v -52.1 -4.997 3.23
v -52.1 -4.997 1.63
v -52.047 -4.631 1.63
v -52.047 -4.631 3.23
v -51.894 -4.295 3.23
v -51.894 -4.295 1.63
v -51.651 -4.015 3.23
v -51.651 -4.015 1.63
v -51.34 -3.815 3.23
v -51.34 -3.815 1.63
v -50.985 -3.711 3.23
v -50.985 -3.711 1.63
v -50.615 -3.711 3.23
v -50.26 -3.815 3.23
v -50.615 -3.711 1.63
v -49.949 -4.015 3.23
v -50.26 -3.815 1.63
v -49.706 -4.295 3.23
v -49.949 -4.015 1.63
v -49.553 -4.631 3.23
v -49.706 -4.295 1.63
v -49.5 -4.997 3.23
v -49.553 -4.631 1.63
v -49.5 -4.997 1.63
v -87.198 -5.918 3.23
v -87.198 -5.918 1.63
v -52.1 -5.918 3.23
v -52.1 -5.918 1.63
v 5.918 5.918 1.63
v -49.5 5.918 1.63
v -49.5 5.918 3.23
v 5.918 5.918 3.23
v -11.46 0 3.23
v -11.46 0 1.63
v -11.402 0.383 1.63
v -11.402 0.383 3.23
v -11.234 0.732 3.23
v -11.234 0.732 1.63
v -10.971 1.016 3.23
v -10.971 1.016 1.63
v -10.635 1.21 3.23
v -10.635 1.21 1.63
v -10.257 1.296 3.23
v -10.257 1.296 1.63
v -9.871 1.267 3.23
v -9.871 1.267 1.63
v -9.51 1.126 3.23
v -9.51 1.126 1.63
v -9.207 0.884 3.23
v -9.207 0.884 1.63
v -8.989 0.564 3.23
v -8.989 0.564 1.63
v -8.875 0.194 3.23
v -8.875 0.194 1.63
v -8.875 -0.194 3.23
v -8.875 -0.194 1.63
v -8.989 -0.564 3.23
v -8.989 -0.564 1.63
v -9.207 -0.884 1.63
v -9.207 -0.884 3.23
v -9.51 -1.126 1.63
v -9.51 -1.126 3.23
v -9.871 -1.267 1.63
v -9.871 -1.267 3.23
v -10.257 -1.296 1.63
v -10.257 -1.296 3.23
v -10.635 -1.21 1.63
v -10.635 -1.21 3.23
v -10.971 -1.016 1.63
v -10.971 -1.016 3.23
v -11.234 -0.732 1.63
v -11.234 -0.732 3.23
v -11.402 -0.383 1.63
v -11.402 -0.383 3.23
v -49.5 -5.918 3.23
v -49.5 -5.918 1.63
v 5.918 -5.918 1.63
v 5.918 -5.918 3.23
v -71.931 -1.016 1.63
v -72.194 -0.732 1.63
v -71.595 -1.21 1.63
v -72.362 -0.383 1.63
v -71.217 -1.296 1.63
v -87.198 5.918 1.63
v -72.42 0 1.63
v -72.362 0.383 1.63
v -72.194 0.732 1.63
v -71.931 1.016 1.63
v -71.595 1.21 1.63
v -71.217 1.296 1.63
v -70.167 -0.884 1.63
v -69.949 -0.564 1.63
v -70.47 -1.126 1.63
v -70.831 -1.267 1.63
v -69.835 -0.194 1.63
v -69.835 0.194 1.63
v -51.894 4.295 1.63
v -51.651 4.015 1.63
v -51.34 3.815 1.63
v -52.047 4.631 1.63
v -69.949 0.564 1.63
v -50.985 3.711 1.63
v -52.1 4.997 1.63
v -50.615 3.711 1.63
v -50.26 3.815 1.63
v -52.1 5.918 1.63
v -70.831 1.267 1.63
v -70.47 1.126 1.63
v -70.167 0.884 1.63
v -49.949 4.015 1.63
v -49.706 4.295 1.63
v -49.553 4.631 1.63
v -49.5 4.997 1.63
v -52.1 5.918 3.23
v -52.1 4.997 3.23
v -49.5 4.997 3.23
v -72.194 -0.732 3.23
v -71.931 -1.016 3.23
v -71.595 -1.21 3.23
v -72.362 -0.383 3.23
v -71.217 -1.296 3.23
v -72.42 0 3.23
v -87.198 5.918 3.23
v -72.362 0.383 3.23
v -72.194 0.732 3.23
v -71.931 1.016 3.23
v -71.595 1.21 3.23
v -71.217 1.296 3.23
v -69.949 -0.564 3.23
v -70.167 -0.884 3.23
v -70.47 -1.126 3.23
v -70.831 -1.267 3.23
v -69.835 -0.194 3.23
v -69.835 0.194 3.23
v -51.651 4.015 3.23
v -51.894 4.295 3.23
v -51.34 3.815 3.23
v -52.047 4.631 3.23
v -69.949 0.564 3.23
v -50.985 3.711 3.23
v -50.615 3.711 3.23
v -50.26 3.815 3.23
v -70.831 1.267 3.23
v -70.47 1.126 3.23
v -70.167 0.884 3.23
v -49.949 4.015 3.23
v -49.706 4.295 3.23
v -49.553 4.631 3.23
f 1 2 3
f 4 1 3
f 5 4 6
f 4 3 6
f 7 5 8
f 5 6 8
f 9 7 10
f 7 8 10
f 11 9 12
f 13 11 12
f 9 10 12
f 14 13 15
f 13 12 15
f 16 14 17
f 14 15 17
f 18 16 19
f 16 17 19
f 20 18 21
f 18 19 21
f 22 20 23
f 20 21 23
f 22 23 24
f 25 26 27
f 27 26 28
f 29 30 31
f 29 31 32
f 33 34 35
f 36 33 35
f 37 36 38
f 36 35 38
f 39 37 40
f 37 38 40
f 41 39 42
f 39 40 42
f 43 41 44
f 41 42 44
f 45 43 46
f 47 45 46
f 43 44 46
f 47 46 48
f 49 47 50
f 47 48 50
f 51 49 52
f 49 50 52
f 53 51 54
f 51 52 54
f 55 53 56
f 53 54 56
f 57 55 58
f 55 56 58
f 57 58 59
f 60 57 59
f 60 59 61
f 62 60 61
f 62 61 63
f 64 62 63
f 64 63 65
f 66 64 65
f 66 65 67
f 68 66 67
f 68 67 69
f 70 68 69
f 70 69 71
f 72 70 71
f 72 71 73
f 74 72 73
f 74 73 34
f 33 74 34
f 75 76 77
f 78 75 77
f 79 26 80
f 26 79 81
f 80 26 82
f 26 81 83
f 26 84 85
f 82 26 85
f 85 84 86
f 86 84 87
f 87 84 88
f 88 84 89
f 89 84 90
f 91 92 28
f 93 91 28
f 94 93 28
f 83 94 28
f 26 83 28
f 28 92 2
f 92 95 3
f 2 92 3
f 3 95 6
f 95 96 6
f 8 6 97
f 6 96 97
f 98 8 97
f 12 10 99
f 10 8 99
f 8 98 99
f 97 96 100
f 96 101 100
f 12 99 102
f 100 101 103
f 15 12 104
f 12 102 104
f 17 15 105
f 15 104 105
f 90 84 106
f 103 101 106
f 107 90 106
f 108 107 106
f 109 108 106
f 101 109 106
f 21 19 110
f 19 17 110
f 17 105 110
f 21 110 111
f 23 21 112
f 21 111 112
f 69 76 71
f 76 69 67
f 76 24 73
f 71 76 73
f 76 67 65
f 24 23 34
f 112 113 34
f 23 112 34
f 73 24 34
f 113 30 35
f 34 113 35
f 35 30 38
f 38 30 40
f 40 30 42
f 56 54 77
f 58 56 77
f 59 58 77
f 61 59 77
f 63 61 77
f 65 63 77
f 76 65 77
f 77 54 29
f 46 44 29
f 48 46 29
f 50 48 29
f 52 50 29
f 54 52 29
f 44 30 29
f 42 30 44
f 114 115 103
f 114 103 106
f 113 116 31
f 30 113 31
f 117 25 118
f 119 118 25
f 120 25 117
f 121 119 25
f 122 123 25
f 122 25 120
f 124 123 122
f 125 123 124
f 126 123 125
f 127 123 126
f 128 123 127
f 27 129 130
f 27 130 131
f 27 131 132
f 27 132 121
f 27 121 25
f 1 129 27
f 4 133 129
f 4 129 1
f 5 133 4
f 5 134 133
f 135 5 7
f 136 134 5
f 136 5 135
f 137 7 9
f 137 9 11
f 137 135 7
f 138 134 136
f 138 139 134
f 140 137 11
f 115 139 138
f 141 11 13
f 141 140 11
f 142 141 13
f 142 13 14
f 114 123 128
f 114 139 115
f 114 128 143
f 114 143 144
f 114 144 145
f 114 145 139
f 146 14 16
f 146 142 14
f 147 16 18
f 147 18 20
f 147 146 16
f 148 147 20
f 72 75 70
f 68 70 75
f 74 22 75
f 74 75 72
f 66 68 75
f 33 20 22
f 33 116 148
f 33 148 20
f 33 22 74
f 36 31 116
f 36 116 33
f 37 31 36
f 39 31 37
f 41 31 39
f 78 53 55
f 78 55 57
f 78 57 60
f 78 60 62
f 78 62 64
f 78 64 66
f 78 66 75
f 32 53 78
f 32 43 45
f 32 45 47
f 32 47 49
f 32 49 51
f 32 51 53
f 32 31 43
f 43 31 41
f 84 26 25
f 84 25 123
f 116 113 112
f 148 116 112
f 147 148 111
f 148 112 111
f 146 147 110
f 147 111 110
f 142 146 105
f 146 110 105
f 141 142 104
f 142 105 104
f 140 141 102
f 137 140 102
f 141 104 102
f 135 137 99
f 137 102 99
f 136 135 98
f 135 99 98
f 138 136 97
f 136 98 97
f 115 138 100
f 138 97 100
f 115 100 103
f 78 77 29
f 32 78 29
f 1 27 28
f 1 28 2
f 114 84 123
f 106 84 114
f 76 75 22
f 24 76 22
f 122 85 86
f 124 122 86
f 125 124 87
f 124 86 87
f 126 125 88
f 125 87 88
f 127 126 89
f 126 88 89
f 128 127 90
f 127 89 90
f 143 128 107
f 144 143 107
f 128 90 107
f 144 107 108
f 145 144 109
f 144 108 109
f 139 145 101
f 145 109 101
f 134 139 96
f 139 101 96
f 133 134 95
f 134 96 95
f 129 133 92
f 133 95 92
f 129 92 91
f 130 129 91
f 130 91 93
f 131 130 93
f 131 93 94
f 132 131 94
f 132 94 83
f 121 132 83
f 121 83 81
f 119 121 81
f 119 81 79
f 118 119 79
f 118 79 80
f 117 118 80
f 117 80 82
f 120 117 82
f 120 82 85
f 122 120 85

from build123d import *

# Parameters (mm, degrees)
SKETCH1_W                  = 93.116399905
SKETCH1_H                  = 11.836399908
BOSS_EXTRUDE1_DEPTH        = 1.6002
F_2_6_2_6_DIAMETER_HOLE1_D = 2.6
SKETCH6_W                  = 2.6
SKETCH6_H                  = 0.920741122
CUT_EXTRUDE1_DEPTH         = 2.6002


with BuildPart() as part:
    # Sketch1 → Boss-Extrude1 (new body)
    with BuildSketch(Plane.XY.offset(1.63)):
        with Locations((-40.639999999, 0)):
            Rectangle(SKETCH1_W, SKETCH1_H)
    extrude(amount=BOSS_EXTRUDE1_DEPTH)

    # Ø2.6 (2.6) Diameter Hole1 (through all)
    with Locations(Plane.XY.offset(3.2302)):
        with Locations((-50.800000064, 4.997458832), (-50.800000064, -4.997458832), (-10.160000092, -7.6e-08), (-71.119999812, -3.5e-08)):
            Hole(F_2_6_2_6_DIAMETER_HOLE1_D / 2)

    # Sketch6 → Cut-Extrude1 (cut, through all)
    with BuildSketch(Plane.XY.offset(3.2302)):
        with Locations((-50.800000064, 5.457829393)):
            Rectangle(SKETCH6_W, SKETCH6_H)
        with Locations((-50.800000064, -5.457829393)):
            Rectangle(SKETCH6_W, SKETCH6_H)
    extrude(amount=-CUT_EXTRUDE1_DEPTH, mode=Mode.SUBTRACT)


solid = part.part
